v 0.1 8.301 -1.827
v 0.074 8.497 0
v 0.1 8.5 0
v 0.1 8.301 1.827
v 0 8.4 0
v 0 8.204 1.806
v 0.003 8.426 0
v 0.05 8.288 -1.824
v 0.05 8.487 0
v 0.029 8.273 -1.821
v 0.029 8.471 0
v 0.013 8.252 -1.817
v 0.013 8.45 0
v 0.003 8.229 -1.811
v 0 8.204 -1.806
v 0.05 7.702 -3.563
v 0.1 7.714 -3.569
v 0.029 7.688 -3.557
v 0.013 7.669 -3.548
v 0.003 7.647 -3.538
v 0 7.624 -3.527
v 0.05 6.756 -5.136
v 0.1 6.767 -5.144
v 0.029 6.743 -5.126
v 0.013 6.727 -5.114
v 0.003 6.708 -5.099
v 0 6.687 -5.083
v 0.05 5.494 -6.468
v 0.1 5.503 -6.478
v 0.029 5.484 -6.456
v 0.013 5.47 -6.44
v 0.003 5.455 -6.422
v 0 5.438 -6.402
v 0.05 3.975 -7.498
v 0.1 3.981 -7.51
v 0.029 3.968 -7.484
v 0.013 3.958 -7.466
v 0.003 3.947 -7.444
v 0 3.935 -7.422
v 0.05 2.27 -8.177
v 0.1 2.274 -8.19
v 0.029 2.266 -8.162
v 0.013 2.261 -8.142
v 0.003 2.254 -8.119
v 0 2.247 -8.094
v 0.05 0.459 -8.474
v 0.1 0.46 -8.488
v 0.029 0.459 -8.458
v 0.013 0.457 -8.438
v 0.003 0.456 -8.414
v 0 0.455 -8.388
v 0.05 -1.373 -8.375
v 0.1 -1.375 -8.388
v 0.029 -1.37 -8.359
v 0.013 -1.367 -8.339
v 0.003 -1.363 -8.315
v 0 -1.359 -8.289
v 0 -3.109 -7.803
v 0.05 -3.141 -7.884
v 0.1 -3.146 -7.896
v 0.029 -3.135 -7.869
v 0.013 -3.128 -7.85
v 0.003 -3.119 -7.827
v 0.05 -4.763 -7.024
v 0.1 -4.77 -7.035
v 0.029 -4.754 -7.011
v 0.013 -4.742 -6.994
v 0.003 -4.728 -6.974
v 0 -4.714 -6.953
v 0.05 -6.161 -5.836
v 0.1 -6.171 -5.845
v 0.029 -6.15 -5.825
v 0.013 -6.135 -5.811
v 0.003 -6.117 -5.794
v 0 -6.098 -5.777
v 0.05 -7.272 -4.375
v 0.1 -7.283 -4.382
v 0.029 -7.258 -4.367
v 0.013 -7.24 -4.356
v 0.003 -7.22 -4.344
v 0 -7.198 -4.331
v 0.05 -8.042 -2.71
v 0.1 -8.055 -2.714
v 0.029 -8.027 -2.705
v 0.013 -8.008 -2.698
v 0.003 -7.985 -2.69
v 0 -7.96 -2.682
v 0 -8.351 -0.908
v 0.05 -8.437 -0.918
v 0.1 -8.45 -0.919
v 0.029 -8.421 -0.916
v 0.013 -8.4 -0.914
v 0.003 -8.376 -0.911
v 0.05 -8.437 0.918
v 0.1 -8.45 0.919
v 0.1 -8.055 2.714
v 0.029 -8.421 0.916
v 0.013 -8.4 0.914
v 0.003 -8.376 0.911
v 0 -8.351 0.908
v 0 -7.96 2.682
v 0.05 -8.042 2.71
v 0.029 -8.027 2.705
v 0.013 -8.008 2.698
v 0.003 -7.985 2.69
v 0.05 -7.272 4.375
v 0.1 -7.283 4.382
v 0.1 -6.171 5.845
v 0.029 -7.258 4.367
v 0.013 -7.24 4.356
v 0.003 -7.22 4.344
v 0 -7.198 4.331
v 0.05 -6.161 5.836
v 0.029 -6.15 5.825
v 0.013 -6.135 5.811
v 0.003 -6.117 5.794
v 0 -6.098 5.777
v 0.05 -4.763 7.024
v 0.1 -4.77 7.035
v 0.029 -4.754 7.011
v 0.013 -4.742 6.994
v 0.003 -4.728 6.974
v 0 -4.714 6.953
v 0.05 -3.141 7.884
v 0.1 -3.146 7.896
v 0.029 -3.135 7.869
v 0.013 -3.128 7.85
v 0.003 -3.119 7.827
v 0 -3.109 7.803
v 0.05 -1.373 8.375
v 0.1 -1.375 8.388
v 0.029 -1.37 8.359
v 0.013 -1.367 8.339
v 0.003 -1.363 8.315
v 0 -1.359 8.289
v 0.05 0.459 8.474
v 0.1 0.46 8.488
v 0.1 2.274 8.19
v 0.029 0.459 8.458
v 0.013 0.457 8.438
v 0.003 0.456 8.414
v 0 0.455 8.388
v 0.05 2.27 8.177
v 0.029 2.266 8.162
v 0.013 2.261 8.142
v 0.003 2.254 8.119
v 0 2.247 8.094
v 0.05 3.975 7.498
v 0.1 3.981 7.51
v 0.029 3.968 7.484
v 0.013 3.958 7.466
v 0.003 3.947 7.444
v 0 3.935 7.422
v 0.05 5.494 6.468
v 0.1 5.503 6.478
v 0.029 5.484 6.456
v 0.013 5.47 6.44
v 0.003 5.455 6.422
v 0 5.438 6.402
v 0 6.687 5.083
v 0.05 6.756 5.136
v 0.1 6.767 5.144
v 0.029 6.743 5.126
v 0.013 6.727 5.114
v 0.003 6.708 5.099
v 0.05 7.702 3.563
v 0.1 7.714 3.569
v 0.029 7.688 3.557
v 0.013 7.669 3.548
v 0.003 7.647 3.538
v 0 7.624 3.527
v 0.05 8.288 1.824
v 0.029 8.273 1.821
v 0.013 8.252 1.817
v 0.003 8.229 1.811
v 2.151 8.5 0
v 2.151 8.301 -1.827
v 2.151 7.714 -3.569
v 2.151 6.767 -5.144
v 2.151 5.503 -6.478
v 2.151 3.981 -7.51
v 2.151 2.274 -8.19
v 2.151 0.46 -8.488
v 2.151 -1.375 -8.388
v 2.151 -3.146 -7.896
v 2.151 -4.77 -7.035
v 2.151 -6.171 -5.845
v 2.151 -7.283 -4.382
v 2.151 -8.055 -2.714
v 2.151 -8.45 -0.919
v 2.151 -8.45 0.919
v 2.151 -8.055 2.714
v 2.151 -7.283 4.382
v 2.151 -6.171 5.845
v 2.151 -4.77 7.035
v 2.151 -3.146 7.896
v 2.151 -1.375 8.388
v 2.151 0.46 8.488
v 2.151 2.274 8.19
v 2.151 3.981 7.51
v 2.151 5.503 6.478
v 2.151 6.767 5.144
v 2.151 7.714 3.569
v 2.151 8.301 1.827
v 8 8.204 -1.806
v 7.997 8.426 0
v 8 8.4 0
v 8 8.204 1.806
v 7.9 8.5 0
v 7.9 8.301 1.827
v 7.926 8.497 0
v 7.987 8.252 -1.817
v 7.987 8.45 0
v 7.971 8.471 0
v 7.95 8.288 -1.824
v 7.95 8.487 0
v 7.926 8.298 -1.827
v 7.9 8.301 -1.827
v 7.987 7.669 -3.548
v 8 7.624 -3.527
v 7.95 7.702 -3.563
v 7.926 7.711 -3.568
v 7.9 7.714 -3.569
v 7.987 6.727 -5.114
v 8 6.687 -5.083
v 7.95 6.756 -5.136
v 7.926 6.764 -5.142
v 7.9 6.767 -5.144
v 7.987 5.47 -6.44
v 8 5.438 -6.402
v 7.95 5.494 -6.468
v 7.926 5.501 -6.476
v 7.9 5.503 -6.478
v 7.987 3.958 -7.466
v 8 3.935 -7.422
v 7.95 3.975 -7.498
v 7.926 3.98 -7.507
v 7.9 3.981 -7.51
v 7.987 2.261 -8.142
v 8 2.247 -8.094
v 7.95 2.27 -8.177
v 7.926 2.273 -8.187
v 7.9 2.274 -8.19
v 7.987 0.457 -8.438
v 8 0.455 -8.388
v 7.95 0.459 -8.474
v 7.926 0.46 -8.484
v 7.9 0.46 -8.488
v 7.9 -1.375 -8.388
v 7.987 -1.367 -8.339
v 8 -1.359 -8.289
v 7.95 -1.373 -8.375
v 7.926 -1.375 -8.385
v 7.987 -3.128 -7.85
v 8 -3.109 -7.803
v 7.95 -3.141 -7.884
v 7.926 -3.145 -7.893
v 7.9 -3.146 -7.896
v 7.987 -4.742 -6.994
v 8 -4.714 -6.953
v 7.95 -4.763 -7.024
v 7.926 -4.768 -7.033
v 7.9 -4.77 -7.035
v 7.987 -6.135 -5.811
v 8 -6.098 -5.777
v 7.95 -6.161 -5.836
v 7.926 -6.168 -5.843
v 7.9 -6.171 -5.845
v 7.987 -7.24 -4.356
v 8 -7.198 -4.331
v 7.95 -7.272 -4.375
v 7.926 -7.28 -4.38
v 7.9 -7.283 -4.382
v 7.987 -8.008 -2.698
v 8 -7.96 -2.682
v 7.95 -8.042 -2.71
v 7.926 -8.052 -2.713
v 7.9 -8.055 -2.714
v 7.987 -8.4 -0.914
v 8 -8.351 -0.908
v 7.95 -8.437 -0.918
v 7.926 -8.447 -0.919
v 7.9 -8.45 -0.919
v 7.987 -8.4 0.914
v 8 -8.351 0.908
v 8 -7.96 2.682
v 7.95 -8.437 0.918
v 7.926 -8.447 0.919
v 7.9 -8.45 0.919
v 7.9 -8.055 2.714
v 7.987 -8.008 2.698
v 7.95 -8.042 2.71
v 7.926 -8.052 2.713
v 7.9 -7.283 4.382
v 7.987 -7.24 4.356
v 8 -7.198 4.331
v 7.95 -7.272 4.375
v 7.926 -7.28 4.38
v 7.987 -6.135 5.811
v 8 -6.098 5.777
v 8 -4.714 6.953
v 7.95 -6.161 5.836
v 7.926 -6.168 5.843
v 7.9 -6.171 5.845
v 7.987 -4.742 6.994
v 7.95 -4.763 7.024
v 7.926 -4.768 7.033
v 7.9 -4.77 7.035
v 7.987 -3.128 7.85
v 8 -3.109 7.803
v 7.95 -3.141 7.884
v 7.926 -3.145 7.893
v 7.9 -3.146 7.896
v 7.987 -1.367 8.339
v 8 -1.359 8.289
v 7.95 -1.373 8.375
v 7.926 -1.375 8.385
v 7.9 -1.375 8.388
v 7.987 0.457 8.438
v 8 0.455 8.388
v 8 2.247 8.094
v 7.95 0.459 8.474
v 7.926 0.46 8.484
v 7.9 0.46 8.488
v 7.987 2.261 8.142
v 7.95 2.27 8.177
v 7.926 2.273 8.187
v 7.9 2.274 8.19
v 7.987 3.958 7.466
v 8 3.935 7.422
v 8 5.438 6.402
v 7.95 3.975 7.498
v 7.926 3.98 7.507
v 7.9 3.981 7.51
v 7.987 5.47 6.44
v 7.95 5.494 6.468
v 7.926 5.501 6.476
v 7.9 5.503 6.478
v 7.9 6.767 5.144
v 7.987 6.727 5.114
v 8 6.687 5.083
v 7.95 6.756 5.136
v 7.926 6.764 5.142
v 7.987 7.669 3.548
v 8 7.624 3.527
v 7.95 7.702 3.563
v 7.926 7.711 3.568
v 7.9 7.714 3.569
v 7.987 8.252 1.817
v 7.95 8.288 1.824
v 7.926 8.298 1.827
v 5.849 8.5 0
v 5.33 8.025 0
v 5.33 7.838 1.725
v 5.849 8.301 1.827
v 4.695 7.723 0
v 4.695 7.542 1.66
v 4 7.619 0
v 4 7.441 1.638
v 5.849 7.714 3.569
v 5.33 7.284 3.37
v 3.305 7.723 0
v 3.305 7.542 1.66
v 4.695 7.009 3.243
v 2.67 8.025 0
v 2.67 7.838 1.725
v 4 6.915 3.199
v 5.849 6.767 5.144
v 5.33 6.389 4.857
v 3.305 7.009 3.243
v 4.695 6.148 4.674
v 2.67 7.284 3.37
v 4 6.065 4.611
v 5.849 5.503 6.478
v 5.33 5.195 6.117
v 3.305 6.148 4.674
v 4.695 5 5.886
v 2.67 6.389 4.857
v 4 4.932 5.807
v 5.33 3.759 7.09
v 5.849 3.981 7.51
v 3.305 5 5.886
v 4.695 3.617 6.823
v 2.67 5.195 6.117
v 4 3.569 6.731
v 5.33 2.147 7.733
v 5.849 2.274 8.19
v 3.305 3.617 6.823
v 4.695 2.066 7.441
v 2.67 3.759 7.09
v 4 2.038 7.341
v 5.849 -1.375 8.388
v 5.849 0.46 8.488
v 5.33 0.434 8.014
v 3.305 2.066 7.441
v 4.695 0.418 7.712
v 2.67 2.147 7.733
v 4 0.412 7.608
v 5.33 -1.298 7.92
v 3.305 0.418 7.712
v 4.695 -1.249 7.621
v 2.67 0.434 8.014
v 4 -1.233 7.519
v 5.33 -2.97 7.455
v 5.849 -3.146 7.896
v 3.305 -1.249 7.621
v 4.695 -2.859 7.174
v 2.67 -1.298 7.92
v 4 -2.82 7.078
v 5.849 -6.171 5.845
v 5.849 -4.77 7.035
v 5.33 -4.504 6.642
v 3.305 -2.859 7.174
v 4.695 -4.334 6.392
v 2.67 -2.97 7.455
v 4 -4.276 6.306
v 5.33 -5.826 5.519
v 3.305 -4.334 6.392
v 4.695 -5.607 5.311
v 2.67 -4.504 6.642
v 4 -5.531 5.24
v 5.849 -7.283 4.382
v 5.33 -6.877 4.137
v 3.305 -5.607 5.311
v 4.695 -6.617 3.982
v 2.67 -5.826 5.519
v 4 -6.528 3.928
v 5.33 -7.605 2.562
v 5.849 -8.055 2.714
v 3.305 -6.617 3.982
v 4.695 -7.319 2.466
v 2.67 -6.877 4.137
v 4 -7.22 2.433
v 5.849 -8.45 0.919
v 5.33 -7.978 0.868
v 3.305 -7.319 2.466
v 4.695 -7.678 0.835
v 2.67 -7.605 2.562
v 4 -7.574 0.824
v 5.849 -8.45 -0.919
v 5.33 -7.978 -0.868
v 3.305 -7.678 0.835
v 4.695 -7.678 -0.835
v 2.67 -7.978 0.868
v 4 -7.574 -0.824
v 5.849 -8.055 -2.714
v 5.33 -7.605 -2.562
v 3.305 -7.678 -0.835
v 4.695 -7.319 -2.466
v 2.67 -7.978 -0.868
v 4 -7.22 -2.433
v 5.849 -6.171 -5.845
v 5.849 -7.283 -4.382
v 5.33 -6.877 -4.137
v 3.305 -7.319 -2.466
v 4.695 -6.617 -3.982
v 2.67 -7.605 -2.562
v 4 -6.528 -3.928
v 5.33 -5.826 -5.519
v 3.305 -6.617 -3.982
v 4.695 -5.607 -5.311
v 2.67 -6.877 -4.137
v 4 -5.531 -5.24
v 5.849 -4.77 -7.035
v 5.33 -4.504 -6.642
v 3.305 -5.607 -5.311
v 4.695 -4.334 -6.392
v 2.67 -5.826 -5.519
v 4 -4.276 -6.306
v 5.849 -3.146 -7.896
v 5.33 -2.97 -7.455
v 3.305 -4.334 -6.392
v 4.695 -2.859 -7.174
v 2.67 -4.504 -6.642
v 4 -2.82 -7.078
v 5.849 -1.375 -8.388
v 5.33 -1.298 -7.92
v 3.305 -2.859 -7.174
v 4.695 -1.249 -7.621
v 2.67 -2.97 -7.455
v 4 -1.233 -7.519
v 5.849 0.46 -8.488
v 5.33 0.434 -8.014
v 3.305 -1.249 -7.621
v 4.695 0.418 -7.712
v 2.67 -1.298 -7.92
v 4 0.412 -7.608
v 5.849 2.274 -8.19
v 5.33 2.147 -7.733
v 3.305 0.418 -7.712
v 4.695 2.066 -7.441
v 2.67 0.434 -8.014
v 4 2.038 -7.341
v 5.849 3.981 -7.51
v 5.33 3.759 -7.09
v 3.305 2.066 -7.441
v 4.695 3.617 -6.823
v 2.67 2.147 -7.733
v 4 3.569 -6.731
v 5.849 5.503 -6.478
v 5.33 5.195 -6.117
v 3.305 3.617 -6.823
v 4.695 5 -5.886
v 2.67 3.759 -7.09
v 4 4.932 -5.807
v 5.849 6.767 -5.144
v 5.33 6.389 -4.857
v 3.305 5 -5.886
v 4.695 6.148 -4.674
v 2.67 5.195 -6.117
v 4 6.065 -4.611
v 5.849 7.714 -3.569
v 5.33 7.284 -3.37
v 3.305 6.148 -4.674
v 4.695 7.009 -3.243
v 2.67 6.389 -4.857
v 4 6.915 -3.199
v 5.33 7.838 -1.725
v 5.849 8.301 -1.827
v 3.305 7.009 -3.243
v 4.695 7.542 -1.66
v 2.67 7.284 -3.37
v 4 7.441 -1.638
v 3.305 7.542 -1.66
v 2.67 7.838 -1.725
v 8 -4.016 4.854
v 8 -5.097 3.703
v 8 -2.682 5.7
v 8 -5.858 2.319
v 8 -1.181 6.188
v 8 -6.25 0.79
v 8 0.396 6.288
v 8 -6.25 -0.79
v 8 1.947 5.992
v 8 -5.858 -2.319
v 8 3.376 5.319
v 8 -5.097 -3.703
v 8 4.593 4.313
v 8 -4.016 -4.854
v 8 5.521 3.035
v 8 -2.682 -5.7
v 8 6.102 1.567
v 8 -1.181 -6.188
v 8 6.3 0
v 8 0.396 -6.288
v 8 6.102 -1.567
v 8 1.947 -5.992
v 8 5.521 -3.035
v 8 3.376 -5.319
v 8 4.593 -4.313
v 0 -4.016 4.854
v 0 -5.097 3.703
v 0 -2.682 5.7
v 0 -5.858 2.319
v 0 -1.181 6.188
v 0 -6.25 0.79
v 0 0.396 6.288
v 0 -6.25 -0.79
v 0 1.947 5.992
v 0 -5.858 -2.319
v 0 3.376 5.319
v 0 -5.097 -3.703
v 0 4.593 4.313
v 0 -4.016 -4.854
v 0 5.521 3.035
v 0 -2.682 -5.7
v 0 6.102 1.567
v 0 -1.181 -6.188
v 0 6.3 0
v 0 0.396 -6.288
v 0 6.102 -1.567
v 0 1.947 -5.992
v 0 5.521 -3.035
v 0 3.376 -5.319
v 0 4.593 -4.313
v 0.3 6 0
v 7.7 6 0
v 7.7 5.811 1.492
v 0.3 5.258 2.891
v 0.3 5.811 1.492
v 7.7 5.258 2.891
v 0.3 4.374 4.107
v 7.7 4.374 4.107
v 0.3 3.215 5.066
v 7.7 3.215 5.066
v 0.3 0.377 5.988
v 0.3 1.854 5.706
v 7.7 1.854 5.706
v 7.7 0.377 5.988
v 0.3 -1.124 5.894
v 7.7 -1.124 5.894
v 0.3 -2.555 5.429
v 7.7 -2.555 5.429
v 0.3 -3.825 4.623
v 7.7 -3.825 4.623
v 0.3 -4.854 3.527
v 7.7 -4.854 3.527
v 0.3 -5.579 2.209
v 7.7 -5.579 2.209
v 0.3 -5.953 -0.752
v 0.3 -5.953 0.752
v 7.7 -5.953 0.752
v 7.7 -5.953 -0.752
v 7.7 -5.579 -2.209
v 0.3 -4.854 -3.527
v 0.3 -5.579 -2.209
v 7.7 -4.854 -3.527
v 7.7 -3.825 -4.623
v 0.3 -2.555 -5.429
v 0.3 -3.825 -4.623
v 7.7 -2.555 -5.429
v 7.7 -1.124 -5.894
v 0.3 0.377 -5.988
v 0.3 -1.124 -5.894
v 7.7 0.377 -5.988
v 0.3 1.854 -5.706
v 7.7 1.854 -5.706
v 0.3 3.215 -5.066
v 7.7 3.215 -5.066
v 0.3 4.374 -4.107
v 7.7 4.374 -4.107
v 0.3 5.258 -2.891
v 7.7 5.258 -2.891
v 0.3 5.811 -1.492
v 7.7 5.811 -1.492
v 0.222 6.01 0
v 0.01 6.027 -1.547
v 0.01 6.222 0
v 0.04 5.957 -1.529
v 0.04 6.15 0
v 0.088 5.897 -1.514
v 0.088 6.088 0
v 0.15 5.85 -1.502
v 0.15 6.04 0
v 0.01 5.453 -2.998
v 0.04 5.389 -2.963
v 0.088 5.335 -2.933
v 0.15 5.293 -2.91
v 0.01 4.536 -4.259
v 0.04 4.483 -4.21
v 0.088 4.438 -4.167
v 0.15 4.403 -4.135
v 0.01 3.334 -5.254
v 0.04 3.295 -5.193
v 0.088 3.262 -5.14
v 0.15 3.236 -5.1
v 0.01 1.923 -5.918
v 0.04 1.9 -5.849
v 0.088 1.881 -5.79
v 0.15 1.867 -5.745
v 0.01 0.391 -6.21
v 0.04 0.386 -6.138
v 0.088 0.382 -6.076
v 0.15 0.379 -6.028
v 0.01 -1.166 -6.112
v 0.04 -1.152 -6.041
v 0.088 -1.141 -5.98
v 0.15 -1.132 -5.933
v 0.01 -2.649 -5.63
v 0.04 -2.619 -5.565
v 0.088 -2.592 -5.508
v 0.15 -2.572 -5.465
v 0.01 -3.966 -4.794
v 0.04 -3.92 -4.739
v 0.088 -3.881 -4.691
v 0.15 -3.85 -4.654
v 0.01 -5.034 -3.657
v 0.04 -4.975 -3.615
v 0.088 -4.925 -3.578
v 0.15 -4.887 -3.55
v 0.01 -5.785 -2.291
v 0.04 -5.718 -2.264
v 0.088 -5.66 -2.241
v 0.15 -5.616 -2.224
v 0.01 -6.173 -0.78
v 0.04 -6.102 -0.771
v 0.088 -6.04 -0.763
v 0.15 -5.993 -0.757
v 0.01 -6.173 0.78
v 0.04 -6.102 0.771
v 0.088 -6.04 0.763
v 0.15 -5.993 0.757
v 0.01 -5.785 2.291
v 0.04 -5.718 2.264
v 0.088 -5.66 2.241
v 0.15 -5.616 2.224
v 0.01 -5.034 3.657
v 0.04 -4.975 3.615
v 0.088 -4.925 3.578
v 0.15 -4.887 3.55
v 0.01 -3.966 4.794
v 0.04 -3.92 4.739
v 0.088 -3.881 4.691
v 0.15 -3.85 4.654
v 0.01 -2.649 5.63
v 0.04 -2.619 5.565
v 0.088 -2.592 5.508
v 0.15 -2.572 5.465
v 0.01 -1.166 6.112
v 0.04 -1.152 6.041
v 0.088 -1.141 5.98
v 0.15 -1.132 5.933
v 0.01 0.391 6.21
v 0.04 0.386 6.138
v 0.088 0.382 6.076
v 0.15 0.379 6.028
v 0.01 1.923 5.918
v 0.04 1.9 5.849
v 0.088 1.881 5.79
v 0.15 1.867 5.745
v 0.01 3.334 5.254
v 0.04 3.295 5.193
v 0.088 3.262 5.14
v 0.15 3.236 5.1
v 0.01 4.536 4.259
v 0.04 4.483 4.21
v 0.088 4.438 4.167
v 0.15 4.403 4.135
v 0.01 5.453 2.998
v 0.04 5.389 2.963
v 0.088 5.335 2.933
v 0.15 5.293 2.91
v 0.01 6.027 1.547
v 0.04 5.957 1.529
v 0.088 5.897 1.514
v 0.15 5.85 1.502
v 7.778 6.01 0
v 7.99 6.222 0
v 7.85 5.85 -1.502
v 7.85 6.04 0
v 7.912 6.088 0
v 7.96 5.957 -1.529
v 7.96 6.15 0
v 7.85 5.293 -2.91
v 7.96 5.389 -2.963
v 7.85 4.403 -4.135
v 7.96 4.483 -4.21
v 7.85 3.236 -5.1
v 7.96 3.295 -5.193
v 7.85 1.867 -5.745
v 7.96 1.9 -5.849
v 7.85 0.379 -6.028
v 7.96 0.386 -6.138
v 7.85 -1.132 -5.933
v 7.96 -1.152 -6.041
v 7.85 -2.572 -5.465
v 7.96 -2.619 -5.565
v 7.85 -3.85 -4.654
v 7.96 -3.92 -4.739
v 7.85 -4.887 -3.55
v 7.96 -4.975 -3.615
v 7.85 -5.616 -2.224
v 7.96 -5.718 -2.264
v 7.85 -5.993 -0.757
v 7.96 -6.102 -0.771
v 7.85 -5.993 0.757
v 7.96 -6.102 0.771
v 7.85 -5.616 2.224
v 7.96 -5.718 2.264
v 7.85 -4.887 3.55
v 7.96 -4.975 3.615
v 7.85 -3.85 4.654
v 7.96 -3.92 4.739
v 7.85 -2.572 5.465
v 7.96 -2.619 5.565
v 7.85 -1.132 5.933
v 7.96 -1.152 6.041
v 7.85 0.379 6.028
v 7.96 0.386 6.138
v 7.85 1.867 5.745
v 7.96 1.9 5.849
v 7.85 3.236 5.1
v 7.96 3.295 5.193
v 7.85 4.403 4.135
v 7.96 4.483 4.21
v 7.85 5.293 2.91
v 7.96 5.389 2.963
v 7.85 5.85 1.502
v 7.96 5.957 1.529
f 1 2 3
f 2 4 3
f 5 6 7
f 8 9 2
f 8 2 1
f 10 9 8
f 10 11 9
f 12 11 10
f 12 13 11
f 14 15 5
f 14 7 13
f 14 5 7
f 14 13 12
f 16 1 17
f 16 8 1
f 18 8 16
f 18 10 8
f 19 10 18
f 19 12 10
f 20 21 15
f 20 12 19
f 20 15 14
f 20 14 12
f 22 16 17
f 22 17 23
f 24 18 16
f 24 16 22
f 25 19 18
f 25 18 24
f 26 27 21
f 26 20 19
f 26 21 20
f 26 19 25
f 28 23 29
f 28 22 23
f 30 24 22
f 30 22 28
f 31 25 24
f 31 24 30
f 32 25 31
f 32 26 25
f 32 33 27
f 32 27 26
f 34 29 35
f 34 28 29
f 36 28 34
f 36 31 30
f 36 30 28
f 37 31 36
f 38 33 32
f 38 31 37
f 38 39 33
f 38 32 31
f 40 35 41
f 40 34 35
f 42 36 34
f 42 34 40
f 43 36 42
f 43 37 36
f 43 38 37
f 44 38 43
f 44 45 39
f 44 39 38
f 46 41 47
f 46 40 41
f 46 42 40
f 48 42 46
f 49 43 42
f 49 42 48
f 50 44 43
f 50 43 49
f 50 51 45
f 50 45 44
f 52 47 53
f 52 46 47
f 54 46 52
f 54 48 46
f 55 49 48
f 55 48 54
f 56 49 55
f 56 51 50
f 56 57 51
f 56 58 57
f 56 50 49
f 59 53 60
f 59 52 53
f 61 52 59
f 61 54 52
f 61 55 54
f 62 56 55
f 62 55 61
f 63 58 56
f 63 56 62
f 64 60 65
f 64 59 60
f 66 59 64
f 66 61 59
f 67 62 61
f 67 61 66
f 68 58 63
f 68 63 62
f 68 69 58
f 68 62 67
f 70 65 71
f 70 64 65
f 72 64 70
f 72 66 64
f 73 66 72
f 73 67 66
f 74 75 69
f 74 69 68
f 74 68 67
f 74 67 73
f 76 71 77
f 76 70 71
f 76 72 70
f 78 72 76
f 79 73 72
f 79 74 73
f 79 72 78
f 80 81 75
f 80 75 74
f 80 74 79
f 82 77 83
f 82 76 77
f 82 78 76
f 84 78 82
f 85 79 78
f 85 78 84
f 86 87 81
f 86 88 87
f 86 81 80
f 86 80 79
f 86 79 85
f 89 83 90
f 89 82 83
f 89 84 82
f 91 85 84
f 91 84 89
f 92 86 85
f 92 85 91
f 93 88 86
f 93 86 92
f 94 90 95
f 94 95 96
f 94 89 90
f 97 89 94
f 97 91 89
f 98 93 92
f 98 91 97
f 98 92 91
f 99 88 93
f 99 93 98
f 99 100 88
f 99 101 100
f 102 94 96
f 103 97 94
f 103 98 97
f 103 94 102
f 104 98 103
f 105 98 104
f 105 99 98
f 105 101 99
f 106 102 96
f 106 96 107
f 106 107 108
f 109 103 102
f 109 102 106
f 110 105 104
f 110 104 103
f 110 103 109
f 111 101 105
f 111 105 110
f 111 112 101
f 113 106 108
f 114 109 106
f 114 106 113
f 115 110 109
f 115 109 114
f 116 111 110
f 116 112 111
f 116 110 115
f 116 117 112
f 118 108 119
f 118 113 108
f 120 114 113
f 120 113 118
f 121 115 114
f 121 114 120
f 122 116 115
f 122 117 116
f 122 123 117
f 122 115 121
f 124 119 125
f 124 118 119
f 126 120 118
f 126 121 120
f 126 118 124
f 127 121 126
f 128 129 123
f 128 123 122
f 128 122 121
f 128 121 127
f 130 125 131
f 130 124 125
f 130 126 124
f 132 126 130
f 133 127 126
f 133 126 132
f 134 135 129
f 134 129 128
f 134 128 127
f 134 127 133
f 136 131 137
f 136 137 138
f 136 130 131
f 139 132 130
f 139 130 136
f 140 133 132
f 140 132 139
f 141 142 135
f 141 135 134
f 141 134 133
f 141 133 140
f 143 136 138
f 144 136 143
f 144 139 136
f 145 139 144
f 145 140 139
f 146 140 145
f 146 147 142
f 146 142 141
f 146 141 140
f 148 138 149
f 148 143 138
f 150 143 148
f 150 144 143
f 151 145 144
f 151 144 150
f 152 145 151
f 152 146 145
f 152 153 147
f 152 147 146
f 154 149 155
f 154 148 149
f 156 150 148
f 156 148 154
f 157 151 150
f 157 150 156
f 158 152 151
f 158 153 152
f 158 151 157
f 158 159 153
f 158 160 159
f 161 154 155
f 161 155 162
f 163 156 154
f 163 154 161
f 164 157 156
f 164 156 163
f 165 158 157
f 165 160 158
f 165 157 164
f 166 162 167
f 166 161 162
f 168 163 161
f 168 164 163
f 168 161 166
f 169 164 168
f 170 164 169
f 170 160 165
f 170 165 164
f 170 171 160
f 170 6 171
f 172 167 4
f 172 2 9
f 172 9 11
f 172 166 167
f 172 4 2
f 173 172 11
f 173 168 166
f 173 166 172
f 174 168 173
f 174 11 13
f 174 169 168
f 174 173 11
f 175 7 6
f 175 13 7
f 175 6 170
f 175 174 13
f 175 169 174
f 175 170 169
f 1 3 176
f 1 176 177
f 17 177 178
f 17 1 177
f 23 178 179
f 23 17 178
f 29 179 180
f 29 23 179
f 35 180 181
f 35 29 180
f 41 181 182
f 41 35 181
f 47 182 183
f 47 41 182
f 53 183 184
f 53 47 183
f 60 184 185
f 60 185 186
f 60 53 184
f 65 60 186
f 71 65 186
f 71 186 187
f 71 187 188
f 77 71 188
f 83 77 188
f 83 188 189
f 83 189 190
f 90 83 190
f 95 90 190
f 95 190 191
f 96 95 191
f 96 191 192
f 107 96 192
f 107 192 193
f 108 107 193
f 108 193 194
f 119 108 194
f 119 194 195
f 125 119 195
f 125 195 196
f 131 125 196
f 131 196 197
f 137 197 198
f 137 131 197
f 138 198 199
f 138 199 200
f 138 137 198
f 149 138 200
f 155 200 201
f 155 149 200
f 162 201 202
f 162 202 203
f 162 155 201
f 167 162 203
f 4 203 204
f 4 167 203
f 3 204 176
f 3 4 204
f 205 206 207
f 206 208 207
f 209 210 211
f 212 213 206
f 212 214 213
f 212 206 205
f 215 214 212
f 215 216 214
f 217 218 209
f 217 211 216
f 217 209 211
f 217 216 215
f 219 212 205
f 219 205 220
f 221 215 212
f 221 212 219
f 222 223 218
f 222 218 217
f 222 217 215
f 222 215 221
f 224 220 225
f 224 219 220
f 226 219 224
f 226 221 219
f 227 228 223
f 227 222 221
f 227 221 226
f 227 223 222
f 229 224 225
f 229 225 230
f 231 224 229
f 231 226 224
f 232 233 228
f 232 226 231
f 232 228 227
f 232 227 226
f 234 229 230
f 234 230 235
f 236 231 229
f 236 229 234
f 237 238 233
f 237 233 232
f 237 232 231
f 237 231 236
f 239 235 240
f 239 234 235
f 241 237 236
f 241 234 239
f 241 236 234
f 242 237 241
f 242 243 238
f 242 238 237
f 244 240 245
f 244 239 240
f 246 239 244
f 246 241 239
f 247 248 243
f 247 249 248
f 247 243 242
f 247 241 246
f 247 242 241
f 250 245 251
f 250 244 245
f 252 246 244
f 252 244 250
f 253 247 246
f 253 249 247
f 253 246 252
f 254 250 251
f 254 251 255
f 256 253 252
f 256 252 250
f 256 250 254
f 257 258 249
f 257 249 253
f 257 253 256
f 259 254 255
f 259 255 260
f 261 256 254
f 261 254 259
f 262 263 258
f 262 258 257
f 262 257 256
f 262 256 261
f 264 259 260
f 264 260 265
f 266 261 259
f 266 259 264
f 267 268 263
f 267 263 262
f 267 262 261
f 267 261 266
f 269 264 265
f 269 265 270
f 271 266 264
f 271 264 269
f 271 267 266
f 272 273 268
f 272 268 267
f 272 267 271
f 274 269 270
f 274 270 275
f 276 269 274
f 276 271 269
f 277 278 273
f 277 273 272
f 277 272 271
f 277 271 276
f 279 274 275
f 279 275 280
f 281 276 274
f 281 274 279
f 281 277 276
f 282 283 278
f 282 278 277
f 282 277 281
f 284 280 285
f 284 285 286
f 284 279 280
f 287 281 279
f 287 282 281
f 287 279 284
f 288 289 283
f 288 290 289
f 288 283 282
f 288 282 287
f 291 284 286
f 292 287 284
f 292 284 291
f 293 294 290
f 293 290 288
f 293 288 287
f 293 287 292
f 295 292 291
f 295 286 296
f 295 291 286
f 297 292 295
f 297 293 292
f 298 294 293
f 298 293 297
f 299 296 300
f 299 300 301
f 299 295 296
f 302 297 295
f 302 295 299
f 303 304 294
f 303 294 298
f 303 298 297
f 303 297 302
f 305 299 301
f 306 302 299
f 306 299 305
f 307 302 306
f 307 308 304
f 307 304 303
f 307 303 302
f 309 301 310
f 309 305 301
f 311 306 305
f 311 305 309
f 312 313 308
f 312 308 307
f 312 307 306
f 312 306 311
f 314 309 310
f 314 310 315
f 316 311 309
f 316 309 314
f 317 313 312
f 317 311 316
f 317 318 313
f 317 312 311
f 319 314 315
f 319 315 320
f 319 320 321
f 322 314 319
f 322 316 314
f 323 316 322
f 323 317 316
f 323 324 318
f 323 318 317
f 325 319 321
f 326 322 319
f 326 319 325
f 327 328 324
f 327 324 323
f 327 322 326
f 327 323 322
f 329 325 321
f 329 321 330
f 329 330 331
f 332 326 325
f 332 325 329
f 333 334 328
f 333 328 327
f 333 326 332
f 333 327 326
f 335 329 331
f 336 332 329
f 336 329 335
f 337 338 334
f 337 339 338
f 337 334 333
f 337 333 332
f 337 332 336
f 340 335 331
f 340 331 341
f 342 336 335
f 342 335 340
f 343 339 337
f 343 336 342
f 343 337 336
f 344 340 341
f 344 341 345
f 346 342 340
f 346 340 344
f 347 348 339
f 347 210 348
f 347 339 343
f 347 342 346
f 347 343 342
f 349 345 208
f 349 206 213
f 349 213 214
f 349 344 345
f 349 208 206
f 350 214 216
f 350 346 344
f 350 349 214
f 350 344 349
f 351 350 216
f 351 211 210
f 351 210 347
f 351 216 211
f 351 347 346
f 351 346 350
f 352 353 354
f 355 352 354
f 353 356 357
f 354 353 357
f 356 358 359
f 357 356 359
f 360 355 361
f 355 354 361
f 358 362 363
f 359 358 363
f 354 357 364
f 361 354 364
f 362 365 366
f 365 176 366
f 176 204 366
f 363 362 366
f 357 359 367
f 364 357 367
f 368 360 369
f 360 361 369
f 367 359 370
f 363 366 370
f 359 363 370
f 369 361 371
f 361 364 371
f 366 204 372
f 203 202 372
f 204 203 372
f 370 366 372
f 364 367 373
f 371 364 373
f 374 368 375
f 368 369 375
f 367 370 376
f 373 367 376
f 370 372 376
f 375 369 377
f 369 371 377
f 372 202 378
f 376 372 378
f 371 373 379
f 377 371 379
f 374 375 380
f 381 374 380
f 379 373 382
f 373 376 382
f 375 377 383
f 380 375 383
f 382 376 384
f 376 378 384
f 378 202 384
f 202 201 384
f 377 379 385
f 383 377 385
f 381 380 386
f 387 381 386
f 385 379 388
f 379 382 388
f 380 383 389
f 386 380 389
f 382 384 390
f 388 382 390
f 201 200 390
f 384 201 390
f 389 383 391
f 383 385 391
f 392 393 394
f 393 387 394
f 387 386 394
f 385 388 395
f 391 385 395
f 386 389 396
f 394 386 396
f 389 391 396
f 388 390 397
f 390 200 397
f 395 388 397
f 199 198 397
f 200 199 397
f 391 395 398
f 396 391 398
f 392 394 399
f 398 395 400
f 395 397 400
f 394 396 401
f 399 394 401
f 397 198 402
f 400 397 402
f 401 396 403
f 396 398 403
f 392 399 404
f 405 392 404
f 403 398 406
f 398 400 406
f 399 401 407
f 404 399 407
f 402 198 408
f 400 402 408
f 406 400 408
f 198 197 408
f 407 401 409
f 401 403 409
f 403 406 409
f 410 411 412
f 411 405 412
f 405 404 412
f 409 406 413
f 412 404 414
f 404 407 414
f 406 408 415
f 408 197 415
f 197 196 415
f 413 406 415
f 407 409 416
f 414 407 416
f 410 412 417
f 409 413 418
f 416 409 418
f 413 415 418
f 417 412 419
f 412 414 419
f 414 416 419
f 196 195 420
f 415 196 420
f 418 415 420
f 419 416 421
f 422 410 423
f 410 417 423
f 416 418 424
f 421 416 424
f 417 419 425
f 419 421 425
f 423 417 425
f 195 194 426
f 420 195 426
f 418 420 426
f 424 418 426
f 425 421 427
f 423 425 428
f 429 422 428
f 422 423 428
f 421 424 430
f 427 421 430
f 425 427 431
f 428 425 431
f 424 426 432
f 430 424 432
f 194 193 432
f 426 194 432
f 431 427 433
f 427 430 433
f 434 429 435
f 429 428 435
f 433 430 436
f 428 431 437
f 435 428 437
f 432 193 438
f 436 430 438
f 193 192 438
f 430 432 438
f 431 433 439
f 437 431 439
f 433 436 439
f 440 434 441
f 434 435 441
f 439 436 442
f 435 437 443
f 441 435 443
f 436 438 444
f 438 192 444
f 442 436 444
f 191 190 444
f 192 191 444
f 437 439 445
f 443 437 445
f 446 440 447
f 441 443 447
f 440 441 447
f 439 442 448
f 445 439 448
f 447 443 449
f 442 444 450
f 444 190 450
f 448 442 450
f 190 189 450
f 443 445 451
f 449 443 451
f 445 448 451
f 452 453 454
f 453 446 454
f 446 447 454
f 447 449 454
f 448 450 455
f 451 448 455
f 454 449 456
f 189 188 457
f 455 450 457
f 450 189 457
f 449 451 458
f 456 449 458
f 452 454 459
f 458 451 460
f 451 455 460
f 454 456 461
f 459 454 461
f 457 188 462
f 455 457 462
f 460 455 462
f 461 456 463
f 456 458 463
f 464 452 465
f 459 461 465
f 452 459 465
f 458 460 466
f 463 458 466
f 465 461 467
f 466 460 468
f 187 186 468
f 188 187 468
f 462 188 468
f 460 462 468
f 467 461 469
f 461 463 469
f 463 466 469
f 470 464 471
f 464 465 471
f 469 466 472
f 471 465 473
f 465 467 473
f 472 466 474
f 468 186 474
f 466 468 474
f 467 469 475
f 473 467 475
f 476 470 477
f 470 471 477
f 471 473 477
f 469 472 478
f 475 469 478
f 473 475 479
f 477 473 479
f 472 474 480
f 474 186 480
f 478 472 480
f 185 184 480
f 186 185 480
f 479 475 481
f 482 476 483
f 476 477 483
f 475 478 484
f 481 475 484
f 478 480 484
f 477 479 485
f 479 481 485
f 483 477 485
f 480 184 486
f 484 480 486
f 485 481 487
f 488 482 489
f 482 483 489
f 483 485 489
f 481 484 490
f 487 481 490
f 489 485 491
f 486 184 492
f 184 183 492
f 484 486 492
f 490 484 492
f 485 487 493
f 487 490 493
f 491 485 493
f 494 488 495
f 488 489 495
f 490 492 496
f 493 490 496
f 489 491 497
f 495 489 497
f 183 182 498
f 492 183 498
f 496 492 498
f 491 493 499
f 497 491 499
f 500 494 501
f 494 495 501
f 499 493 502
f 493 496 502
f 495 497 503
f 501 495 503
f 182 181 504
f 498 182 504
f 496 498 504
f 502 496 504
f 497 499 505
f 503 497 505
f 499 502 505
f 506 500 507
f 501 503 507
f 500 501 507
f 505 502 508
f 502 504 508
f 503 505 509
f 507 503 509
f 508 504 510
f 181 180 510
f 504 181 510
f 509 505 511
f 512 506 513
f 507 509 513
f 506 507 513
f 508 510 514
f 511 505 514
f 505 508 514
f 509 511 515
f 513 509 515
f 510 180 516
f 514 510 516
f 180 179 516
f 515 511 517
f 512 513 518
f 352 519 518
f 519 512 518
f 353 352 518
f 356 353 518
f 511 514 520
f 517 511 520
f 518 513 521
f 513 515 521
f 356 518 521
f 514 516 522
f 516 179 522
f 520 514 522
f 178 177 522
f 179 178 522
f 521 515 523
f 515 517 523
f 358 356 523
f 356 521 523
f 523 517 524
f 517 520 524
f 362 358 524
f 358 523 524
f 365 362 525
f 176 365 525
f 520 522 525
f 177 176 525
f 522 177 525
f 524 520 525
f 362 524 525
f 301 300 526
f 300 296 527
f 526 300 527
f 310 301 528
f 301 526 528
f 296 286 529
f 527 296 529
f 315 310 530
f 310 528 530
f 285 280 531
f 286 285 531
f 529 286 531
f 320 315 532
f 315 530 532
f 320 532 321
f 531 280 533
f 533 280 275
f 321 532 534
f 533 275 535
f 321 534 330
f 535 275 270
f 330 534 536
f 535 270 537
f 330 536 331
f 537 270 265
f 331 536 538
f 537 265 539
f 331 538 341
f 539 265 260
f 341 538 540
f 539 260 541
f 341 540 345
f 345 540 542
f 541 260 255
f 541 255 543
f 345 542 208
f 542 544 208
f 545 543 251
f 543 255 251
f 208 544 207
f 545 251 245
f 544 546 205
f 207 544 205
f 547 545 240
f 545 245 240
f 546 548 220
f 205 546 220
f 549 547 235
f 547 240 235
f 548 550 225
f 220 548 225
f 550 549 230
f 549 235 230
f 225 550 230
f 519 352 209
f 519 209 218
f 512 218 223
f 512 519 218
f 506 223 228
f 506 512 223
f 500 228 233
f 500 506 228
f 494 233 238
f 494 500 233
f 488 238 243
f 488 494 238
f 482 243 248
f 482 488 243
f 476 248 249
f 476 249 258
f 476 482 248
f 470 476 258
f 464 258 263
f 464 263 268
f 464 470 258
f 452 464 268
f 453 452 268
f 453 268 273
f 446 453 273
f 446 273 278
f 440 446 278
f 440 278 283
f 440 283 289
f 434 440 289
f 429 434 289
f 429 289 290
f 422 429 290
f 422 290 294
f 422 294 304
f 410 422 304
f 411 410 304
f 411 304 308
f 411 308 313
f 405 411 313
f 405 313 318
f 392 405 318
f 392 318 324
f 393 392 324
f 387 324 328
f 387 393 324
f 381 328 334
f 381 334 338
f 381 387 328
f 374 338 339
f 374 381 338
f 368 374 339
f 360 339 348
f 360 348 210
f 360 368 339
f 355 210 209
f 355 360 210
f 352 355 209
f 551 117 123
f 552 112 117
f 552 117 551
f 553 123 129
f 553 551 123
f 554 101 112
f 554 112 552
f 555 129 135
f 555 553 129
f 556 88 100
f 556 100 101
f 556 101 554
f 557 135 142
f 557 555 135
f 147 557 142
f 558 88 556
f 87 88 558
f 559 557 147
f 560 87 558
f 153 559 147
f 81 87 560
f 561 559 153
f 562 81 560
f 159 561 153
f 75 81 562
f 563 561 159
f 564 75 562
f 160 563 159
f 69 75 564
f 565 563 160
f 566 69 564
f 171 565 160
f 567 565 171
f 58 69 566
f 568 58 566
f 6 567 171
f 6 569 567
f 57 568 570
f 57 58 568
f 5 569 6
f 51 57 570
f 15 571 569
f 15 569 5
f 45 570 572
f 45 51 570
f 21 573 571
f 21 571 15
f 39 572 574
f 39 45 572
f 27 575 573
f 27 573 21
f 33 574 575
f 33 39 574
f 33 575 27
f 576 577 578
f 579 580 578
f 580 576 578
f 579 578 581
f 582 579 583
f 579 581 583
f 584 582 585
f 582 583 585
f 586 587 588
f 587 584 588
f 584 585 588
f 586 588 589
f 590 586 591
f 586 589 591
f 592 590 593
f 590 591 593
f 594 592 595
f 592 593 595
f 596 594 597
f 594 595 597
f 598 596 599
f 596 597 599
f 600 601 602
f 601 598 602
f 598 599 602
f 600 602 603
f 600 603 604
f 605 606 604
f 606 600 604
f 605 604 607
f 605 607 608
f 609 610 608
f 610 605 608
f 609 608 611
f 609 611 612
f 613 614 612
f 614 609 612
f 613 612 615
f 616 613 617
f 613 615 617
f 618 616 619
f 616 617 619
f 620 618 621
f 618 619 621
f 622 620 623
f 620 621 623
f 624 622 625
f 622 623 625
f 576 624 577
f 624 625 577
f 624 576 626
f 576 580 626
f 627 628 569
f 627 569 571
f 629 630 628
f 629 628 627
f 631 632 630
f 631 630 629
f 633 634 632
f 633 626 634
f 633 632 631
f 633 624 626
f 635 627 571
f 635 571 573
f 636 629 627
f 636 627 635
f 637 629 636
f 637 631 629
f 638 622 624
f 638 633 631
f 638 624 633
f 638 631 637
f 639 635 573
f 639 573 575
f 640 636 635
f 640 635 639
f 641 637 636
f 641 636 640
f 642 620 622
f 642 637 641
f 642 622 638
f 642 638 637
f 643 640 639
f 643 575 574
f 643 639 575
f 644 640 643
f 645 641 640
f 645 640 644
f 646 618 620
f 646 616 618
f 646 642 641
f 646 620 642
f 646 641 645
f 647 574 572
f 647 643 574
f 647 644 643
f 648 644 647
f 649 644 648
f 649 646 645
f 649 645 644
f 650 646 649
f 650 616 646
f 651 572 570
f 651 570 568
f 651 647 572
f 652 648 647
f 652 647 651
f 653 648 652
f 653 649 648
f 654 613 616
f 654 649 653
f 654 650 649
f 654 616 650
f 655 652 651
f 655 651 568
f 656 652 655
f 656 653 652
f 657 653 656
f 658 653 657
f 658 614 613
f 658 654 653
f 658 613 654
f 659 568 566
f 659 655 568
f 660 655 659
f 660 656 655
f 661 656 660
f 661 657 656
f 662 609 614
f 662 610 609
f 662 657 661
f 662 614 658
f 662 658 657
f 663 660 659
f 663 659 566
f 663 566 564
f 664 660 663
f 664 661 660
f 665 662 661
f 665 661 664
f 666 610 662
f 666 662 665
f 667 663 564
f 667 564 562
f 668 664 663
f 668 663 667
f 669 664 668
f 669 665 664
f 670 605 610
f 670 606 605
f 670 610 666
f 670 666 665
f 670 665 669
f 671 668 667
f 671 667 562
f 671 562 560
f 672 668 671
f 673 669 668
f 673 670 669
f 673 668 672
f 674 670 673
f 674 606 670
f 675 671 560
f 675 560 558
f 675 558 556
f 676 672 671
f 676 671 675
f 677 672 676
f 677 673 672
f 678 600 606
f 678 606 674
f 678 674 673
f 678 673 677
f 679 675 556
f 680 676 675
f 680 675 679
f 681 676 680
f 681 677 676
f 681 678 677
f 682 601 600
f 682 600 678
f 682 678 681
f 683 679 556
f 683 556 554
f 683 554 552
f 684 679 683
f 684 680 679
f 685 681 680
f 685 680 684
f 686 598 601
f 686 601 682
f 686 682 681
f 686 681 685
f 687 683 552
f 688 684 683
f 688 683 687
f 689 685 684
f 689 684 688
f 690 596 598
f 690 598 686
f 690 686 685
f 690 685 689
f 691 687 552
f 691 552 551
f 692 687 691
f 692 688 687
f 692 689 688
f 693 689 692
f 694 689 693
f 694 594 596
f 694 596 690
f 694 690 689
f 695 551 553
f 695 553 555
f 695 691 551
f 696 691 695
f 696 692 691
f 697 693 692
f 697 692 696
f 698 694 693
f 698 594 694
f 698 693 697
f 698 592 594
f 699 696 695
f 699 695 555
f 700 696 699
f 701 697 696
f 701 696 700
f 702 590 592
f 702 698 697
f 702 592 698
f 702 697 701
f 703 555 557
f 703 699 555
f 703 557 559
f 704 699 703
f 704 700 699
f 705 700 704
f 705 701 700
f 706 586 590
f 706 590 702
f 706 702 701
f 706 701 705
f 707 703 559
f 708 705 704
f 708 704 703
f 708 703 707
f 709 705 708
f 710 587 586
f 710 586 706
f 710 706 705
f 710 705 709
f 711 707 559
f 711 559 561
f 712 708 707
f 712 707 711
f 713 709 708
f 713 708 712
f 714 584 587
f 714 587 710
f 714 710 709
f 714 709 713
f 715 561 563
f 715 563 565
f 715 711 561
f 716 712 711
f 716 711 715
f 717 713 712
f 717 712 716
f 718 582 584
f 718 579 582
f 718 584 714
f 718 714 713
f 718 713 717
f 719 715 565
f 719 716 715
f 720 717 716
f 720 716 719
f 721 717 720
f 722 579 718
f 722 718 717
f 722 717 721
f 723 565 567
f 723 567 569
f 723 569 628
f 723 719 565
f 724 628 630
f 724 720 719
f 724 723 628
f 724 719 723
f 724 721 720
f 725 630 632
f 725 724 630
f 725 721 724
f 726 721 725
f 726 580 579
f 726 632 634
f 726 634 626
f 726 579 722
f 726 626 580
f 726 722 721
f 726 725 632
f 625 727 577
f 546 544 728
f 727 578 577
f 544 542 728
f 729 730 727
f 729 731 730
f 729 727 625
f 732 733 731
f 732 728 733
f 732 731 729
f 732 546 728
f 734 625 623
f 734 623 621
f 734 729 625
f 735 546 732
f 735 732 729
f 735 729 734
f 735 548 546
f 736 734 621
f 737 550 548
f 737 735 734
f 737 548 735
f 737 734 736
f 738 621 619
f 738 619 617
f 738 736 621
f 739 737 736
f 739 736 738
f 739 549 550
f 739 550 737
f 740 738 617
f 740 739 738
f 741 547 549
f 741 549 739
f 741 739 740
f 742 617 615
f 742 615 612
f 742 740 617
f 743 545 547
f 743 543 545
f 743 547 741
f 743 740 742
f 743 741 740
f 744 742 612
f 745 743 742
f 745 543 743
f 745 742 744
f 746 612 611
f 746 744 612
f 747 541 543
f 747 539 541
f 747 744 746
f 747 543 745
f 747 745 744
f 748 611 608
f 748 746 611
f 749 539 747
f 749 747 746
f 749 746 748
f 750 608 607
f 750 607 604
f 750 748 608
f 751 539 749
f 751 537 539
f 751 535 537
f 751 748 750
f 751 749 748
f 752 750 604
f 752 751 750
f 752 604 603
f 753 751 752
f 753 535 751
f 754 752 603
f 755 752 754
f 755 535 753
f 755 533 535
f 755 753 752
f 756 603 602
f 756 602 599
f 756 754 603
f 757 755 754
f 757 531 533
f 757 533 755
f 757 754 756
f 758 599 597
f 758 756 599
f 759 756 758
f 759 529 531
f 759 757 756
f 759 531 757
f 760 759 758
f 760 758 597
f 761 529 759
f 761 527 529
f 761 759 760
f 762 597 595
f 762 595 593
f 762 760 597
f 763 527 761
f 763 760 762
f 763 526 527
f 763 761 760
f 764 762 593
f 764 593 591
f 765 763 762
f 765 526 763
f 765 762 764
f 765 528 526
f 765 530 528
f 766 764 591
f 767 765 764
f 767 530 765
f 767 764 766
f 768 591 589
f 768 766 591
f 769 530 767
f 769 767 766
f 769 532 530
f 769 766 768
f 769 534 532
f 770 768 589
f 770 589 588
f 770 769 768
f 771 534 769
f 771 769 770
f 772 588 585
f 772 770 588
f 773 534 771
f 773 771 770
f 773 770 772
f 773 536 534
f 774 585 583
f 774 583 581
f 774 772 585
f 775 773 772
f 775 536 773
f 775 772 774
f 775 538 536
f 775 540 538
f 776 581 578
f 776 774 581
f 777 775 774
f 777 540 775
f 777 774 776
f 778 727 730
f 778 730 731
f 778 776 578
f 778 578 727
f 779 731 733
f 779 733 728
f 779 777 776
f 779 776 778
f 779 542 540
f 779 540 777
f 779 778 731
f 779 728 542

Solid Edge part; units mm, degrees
sketch "Sketch1" plane through (0, 0, 0) normal (0, 0, 1) x (1, 0, 0)
  arc A0 (0, 6.3) -> (0.3, 6) centre (0.3, 6.3) ccw
  line L0 (0.3, 6) -> (7.7, 6)
  arc A1 (7.7, 6) -> (8, 6.3) centre (7.7, 6.3) ccw
  line L1 (8, 6.3) -> (8, 8.4)
  arc A2 (8, 8.4) -> (7.9, 8.5) centre (7.9, 8.4) ccw
  line L2 (7.9, 8.5) -> (5.8491, 8.5)
  arc A3 (5.8491, 8.5) -> (2.1509, 8.5) centre (4, 10) cw
  line L3 (2.1509, 8.5) -> (0.1, 8.5)
  arc A4 (0.1, 8.5) -> (0, 8.4) centre (0.1, 8.4) ccw
  line L4 (0, 8.4) -> (0, 6.3)
revolve "RevolvedProtrusion1" add sketch "Sketch1" angle 360 about axis through (100, 0, 0) along (-1, 0, 0)
properties part number "SKF_6001_ir"
